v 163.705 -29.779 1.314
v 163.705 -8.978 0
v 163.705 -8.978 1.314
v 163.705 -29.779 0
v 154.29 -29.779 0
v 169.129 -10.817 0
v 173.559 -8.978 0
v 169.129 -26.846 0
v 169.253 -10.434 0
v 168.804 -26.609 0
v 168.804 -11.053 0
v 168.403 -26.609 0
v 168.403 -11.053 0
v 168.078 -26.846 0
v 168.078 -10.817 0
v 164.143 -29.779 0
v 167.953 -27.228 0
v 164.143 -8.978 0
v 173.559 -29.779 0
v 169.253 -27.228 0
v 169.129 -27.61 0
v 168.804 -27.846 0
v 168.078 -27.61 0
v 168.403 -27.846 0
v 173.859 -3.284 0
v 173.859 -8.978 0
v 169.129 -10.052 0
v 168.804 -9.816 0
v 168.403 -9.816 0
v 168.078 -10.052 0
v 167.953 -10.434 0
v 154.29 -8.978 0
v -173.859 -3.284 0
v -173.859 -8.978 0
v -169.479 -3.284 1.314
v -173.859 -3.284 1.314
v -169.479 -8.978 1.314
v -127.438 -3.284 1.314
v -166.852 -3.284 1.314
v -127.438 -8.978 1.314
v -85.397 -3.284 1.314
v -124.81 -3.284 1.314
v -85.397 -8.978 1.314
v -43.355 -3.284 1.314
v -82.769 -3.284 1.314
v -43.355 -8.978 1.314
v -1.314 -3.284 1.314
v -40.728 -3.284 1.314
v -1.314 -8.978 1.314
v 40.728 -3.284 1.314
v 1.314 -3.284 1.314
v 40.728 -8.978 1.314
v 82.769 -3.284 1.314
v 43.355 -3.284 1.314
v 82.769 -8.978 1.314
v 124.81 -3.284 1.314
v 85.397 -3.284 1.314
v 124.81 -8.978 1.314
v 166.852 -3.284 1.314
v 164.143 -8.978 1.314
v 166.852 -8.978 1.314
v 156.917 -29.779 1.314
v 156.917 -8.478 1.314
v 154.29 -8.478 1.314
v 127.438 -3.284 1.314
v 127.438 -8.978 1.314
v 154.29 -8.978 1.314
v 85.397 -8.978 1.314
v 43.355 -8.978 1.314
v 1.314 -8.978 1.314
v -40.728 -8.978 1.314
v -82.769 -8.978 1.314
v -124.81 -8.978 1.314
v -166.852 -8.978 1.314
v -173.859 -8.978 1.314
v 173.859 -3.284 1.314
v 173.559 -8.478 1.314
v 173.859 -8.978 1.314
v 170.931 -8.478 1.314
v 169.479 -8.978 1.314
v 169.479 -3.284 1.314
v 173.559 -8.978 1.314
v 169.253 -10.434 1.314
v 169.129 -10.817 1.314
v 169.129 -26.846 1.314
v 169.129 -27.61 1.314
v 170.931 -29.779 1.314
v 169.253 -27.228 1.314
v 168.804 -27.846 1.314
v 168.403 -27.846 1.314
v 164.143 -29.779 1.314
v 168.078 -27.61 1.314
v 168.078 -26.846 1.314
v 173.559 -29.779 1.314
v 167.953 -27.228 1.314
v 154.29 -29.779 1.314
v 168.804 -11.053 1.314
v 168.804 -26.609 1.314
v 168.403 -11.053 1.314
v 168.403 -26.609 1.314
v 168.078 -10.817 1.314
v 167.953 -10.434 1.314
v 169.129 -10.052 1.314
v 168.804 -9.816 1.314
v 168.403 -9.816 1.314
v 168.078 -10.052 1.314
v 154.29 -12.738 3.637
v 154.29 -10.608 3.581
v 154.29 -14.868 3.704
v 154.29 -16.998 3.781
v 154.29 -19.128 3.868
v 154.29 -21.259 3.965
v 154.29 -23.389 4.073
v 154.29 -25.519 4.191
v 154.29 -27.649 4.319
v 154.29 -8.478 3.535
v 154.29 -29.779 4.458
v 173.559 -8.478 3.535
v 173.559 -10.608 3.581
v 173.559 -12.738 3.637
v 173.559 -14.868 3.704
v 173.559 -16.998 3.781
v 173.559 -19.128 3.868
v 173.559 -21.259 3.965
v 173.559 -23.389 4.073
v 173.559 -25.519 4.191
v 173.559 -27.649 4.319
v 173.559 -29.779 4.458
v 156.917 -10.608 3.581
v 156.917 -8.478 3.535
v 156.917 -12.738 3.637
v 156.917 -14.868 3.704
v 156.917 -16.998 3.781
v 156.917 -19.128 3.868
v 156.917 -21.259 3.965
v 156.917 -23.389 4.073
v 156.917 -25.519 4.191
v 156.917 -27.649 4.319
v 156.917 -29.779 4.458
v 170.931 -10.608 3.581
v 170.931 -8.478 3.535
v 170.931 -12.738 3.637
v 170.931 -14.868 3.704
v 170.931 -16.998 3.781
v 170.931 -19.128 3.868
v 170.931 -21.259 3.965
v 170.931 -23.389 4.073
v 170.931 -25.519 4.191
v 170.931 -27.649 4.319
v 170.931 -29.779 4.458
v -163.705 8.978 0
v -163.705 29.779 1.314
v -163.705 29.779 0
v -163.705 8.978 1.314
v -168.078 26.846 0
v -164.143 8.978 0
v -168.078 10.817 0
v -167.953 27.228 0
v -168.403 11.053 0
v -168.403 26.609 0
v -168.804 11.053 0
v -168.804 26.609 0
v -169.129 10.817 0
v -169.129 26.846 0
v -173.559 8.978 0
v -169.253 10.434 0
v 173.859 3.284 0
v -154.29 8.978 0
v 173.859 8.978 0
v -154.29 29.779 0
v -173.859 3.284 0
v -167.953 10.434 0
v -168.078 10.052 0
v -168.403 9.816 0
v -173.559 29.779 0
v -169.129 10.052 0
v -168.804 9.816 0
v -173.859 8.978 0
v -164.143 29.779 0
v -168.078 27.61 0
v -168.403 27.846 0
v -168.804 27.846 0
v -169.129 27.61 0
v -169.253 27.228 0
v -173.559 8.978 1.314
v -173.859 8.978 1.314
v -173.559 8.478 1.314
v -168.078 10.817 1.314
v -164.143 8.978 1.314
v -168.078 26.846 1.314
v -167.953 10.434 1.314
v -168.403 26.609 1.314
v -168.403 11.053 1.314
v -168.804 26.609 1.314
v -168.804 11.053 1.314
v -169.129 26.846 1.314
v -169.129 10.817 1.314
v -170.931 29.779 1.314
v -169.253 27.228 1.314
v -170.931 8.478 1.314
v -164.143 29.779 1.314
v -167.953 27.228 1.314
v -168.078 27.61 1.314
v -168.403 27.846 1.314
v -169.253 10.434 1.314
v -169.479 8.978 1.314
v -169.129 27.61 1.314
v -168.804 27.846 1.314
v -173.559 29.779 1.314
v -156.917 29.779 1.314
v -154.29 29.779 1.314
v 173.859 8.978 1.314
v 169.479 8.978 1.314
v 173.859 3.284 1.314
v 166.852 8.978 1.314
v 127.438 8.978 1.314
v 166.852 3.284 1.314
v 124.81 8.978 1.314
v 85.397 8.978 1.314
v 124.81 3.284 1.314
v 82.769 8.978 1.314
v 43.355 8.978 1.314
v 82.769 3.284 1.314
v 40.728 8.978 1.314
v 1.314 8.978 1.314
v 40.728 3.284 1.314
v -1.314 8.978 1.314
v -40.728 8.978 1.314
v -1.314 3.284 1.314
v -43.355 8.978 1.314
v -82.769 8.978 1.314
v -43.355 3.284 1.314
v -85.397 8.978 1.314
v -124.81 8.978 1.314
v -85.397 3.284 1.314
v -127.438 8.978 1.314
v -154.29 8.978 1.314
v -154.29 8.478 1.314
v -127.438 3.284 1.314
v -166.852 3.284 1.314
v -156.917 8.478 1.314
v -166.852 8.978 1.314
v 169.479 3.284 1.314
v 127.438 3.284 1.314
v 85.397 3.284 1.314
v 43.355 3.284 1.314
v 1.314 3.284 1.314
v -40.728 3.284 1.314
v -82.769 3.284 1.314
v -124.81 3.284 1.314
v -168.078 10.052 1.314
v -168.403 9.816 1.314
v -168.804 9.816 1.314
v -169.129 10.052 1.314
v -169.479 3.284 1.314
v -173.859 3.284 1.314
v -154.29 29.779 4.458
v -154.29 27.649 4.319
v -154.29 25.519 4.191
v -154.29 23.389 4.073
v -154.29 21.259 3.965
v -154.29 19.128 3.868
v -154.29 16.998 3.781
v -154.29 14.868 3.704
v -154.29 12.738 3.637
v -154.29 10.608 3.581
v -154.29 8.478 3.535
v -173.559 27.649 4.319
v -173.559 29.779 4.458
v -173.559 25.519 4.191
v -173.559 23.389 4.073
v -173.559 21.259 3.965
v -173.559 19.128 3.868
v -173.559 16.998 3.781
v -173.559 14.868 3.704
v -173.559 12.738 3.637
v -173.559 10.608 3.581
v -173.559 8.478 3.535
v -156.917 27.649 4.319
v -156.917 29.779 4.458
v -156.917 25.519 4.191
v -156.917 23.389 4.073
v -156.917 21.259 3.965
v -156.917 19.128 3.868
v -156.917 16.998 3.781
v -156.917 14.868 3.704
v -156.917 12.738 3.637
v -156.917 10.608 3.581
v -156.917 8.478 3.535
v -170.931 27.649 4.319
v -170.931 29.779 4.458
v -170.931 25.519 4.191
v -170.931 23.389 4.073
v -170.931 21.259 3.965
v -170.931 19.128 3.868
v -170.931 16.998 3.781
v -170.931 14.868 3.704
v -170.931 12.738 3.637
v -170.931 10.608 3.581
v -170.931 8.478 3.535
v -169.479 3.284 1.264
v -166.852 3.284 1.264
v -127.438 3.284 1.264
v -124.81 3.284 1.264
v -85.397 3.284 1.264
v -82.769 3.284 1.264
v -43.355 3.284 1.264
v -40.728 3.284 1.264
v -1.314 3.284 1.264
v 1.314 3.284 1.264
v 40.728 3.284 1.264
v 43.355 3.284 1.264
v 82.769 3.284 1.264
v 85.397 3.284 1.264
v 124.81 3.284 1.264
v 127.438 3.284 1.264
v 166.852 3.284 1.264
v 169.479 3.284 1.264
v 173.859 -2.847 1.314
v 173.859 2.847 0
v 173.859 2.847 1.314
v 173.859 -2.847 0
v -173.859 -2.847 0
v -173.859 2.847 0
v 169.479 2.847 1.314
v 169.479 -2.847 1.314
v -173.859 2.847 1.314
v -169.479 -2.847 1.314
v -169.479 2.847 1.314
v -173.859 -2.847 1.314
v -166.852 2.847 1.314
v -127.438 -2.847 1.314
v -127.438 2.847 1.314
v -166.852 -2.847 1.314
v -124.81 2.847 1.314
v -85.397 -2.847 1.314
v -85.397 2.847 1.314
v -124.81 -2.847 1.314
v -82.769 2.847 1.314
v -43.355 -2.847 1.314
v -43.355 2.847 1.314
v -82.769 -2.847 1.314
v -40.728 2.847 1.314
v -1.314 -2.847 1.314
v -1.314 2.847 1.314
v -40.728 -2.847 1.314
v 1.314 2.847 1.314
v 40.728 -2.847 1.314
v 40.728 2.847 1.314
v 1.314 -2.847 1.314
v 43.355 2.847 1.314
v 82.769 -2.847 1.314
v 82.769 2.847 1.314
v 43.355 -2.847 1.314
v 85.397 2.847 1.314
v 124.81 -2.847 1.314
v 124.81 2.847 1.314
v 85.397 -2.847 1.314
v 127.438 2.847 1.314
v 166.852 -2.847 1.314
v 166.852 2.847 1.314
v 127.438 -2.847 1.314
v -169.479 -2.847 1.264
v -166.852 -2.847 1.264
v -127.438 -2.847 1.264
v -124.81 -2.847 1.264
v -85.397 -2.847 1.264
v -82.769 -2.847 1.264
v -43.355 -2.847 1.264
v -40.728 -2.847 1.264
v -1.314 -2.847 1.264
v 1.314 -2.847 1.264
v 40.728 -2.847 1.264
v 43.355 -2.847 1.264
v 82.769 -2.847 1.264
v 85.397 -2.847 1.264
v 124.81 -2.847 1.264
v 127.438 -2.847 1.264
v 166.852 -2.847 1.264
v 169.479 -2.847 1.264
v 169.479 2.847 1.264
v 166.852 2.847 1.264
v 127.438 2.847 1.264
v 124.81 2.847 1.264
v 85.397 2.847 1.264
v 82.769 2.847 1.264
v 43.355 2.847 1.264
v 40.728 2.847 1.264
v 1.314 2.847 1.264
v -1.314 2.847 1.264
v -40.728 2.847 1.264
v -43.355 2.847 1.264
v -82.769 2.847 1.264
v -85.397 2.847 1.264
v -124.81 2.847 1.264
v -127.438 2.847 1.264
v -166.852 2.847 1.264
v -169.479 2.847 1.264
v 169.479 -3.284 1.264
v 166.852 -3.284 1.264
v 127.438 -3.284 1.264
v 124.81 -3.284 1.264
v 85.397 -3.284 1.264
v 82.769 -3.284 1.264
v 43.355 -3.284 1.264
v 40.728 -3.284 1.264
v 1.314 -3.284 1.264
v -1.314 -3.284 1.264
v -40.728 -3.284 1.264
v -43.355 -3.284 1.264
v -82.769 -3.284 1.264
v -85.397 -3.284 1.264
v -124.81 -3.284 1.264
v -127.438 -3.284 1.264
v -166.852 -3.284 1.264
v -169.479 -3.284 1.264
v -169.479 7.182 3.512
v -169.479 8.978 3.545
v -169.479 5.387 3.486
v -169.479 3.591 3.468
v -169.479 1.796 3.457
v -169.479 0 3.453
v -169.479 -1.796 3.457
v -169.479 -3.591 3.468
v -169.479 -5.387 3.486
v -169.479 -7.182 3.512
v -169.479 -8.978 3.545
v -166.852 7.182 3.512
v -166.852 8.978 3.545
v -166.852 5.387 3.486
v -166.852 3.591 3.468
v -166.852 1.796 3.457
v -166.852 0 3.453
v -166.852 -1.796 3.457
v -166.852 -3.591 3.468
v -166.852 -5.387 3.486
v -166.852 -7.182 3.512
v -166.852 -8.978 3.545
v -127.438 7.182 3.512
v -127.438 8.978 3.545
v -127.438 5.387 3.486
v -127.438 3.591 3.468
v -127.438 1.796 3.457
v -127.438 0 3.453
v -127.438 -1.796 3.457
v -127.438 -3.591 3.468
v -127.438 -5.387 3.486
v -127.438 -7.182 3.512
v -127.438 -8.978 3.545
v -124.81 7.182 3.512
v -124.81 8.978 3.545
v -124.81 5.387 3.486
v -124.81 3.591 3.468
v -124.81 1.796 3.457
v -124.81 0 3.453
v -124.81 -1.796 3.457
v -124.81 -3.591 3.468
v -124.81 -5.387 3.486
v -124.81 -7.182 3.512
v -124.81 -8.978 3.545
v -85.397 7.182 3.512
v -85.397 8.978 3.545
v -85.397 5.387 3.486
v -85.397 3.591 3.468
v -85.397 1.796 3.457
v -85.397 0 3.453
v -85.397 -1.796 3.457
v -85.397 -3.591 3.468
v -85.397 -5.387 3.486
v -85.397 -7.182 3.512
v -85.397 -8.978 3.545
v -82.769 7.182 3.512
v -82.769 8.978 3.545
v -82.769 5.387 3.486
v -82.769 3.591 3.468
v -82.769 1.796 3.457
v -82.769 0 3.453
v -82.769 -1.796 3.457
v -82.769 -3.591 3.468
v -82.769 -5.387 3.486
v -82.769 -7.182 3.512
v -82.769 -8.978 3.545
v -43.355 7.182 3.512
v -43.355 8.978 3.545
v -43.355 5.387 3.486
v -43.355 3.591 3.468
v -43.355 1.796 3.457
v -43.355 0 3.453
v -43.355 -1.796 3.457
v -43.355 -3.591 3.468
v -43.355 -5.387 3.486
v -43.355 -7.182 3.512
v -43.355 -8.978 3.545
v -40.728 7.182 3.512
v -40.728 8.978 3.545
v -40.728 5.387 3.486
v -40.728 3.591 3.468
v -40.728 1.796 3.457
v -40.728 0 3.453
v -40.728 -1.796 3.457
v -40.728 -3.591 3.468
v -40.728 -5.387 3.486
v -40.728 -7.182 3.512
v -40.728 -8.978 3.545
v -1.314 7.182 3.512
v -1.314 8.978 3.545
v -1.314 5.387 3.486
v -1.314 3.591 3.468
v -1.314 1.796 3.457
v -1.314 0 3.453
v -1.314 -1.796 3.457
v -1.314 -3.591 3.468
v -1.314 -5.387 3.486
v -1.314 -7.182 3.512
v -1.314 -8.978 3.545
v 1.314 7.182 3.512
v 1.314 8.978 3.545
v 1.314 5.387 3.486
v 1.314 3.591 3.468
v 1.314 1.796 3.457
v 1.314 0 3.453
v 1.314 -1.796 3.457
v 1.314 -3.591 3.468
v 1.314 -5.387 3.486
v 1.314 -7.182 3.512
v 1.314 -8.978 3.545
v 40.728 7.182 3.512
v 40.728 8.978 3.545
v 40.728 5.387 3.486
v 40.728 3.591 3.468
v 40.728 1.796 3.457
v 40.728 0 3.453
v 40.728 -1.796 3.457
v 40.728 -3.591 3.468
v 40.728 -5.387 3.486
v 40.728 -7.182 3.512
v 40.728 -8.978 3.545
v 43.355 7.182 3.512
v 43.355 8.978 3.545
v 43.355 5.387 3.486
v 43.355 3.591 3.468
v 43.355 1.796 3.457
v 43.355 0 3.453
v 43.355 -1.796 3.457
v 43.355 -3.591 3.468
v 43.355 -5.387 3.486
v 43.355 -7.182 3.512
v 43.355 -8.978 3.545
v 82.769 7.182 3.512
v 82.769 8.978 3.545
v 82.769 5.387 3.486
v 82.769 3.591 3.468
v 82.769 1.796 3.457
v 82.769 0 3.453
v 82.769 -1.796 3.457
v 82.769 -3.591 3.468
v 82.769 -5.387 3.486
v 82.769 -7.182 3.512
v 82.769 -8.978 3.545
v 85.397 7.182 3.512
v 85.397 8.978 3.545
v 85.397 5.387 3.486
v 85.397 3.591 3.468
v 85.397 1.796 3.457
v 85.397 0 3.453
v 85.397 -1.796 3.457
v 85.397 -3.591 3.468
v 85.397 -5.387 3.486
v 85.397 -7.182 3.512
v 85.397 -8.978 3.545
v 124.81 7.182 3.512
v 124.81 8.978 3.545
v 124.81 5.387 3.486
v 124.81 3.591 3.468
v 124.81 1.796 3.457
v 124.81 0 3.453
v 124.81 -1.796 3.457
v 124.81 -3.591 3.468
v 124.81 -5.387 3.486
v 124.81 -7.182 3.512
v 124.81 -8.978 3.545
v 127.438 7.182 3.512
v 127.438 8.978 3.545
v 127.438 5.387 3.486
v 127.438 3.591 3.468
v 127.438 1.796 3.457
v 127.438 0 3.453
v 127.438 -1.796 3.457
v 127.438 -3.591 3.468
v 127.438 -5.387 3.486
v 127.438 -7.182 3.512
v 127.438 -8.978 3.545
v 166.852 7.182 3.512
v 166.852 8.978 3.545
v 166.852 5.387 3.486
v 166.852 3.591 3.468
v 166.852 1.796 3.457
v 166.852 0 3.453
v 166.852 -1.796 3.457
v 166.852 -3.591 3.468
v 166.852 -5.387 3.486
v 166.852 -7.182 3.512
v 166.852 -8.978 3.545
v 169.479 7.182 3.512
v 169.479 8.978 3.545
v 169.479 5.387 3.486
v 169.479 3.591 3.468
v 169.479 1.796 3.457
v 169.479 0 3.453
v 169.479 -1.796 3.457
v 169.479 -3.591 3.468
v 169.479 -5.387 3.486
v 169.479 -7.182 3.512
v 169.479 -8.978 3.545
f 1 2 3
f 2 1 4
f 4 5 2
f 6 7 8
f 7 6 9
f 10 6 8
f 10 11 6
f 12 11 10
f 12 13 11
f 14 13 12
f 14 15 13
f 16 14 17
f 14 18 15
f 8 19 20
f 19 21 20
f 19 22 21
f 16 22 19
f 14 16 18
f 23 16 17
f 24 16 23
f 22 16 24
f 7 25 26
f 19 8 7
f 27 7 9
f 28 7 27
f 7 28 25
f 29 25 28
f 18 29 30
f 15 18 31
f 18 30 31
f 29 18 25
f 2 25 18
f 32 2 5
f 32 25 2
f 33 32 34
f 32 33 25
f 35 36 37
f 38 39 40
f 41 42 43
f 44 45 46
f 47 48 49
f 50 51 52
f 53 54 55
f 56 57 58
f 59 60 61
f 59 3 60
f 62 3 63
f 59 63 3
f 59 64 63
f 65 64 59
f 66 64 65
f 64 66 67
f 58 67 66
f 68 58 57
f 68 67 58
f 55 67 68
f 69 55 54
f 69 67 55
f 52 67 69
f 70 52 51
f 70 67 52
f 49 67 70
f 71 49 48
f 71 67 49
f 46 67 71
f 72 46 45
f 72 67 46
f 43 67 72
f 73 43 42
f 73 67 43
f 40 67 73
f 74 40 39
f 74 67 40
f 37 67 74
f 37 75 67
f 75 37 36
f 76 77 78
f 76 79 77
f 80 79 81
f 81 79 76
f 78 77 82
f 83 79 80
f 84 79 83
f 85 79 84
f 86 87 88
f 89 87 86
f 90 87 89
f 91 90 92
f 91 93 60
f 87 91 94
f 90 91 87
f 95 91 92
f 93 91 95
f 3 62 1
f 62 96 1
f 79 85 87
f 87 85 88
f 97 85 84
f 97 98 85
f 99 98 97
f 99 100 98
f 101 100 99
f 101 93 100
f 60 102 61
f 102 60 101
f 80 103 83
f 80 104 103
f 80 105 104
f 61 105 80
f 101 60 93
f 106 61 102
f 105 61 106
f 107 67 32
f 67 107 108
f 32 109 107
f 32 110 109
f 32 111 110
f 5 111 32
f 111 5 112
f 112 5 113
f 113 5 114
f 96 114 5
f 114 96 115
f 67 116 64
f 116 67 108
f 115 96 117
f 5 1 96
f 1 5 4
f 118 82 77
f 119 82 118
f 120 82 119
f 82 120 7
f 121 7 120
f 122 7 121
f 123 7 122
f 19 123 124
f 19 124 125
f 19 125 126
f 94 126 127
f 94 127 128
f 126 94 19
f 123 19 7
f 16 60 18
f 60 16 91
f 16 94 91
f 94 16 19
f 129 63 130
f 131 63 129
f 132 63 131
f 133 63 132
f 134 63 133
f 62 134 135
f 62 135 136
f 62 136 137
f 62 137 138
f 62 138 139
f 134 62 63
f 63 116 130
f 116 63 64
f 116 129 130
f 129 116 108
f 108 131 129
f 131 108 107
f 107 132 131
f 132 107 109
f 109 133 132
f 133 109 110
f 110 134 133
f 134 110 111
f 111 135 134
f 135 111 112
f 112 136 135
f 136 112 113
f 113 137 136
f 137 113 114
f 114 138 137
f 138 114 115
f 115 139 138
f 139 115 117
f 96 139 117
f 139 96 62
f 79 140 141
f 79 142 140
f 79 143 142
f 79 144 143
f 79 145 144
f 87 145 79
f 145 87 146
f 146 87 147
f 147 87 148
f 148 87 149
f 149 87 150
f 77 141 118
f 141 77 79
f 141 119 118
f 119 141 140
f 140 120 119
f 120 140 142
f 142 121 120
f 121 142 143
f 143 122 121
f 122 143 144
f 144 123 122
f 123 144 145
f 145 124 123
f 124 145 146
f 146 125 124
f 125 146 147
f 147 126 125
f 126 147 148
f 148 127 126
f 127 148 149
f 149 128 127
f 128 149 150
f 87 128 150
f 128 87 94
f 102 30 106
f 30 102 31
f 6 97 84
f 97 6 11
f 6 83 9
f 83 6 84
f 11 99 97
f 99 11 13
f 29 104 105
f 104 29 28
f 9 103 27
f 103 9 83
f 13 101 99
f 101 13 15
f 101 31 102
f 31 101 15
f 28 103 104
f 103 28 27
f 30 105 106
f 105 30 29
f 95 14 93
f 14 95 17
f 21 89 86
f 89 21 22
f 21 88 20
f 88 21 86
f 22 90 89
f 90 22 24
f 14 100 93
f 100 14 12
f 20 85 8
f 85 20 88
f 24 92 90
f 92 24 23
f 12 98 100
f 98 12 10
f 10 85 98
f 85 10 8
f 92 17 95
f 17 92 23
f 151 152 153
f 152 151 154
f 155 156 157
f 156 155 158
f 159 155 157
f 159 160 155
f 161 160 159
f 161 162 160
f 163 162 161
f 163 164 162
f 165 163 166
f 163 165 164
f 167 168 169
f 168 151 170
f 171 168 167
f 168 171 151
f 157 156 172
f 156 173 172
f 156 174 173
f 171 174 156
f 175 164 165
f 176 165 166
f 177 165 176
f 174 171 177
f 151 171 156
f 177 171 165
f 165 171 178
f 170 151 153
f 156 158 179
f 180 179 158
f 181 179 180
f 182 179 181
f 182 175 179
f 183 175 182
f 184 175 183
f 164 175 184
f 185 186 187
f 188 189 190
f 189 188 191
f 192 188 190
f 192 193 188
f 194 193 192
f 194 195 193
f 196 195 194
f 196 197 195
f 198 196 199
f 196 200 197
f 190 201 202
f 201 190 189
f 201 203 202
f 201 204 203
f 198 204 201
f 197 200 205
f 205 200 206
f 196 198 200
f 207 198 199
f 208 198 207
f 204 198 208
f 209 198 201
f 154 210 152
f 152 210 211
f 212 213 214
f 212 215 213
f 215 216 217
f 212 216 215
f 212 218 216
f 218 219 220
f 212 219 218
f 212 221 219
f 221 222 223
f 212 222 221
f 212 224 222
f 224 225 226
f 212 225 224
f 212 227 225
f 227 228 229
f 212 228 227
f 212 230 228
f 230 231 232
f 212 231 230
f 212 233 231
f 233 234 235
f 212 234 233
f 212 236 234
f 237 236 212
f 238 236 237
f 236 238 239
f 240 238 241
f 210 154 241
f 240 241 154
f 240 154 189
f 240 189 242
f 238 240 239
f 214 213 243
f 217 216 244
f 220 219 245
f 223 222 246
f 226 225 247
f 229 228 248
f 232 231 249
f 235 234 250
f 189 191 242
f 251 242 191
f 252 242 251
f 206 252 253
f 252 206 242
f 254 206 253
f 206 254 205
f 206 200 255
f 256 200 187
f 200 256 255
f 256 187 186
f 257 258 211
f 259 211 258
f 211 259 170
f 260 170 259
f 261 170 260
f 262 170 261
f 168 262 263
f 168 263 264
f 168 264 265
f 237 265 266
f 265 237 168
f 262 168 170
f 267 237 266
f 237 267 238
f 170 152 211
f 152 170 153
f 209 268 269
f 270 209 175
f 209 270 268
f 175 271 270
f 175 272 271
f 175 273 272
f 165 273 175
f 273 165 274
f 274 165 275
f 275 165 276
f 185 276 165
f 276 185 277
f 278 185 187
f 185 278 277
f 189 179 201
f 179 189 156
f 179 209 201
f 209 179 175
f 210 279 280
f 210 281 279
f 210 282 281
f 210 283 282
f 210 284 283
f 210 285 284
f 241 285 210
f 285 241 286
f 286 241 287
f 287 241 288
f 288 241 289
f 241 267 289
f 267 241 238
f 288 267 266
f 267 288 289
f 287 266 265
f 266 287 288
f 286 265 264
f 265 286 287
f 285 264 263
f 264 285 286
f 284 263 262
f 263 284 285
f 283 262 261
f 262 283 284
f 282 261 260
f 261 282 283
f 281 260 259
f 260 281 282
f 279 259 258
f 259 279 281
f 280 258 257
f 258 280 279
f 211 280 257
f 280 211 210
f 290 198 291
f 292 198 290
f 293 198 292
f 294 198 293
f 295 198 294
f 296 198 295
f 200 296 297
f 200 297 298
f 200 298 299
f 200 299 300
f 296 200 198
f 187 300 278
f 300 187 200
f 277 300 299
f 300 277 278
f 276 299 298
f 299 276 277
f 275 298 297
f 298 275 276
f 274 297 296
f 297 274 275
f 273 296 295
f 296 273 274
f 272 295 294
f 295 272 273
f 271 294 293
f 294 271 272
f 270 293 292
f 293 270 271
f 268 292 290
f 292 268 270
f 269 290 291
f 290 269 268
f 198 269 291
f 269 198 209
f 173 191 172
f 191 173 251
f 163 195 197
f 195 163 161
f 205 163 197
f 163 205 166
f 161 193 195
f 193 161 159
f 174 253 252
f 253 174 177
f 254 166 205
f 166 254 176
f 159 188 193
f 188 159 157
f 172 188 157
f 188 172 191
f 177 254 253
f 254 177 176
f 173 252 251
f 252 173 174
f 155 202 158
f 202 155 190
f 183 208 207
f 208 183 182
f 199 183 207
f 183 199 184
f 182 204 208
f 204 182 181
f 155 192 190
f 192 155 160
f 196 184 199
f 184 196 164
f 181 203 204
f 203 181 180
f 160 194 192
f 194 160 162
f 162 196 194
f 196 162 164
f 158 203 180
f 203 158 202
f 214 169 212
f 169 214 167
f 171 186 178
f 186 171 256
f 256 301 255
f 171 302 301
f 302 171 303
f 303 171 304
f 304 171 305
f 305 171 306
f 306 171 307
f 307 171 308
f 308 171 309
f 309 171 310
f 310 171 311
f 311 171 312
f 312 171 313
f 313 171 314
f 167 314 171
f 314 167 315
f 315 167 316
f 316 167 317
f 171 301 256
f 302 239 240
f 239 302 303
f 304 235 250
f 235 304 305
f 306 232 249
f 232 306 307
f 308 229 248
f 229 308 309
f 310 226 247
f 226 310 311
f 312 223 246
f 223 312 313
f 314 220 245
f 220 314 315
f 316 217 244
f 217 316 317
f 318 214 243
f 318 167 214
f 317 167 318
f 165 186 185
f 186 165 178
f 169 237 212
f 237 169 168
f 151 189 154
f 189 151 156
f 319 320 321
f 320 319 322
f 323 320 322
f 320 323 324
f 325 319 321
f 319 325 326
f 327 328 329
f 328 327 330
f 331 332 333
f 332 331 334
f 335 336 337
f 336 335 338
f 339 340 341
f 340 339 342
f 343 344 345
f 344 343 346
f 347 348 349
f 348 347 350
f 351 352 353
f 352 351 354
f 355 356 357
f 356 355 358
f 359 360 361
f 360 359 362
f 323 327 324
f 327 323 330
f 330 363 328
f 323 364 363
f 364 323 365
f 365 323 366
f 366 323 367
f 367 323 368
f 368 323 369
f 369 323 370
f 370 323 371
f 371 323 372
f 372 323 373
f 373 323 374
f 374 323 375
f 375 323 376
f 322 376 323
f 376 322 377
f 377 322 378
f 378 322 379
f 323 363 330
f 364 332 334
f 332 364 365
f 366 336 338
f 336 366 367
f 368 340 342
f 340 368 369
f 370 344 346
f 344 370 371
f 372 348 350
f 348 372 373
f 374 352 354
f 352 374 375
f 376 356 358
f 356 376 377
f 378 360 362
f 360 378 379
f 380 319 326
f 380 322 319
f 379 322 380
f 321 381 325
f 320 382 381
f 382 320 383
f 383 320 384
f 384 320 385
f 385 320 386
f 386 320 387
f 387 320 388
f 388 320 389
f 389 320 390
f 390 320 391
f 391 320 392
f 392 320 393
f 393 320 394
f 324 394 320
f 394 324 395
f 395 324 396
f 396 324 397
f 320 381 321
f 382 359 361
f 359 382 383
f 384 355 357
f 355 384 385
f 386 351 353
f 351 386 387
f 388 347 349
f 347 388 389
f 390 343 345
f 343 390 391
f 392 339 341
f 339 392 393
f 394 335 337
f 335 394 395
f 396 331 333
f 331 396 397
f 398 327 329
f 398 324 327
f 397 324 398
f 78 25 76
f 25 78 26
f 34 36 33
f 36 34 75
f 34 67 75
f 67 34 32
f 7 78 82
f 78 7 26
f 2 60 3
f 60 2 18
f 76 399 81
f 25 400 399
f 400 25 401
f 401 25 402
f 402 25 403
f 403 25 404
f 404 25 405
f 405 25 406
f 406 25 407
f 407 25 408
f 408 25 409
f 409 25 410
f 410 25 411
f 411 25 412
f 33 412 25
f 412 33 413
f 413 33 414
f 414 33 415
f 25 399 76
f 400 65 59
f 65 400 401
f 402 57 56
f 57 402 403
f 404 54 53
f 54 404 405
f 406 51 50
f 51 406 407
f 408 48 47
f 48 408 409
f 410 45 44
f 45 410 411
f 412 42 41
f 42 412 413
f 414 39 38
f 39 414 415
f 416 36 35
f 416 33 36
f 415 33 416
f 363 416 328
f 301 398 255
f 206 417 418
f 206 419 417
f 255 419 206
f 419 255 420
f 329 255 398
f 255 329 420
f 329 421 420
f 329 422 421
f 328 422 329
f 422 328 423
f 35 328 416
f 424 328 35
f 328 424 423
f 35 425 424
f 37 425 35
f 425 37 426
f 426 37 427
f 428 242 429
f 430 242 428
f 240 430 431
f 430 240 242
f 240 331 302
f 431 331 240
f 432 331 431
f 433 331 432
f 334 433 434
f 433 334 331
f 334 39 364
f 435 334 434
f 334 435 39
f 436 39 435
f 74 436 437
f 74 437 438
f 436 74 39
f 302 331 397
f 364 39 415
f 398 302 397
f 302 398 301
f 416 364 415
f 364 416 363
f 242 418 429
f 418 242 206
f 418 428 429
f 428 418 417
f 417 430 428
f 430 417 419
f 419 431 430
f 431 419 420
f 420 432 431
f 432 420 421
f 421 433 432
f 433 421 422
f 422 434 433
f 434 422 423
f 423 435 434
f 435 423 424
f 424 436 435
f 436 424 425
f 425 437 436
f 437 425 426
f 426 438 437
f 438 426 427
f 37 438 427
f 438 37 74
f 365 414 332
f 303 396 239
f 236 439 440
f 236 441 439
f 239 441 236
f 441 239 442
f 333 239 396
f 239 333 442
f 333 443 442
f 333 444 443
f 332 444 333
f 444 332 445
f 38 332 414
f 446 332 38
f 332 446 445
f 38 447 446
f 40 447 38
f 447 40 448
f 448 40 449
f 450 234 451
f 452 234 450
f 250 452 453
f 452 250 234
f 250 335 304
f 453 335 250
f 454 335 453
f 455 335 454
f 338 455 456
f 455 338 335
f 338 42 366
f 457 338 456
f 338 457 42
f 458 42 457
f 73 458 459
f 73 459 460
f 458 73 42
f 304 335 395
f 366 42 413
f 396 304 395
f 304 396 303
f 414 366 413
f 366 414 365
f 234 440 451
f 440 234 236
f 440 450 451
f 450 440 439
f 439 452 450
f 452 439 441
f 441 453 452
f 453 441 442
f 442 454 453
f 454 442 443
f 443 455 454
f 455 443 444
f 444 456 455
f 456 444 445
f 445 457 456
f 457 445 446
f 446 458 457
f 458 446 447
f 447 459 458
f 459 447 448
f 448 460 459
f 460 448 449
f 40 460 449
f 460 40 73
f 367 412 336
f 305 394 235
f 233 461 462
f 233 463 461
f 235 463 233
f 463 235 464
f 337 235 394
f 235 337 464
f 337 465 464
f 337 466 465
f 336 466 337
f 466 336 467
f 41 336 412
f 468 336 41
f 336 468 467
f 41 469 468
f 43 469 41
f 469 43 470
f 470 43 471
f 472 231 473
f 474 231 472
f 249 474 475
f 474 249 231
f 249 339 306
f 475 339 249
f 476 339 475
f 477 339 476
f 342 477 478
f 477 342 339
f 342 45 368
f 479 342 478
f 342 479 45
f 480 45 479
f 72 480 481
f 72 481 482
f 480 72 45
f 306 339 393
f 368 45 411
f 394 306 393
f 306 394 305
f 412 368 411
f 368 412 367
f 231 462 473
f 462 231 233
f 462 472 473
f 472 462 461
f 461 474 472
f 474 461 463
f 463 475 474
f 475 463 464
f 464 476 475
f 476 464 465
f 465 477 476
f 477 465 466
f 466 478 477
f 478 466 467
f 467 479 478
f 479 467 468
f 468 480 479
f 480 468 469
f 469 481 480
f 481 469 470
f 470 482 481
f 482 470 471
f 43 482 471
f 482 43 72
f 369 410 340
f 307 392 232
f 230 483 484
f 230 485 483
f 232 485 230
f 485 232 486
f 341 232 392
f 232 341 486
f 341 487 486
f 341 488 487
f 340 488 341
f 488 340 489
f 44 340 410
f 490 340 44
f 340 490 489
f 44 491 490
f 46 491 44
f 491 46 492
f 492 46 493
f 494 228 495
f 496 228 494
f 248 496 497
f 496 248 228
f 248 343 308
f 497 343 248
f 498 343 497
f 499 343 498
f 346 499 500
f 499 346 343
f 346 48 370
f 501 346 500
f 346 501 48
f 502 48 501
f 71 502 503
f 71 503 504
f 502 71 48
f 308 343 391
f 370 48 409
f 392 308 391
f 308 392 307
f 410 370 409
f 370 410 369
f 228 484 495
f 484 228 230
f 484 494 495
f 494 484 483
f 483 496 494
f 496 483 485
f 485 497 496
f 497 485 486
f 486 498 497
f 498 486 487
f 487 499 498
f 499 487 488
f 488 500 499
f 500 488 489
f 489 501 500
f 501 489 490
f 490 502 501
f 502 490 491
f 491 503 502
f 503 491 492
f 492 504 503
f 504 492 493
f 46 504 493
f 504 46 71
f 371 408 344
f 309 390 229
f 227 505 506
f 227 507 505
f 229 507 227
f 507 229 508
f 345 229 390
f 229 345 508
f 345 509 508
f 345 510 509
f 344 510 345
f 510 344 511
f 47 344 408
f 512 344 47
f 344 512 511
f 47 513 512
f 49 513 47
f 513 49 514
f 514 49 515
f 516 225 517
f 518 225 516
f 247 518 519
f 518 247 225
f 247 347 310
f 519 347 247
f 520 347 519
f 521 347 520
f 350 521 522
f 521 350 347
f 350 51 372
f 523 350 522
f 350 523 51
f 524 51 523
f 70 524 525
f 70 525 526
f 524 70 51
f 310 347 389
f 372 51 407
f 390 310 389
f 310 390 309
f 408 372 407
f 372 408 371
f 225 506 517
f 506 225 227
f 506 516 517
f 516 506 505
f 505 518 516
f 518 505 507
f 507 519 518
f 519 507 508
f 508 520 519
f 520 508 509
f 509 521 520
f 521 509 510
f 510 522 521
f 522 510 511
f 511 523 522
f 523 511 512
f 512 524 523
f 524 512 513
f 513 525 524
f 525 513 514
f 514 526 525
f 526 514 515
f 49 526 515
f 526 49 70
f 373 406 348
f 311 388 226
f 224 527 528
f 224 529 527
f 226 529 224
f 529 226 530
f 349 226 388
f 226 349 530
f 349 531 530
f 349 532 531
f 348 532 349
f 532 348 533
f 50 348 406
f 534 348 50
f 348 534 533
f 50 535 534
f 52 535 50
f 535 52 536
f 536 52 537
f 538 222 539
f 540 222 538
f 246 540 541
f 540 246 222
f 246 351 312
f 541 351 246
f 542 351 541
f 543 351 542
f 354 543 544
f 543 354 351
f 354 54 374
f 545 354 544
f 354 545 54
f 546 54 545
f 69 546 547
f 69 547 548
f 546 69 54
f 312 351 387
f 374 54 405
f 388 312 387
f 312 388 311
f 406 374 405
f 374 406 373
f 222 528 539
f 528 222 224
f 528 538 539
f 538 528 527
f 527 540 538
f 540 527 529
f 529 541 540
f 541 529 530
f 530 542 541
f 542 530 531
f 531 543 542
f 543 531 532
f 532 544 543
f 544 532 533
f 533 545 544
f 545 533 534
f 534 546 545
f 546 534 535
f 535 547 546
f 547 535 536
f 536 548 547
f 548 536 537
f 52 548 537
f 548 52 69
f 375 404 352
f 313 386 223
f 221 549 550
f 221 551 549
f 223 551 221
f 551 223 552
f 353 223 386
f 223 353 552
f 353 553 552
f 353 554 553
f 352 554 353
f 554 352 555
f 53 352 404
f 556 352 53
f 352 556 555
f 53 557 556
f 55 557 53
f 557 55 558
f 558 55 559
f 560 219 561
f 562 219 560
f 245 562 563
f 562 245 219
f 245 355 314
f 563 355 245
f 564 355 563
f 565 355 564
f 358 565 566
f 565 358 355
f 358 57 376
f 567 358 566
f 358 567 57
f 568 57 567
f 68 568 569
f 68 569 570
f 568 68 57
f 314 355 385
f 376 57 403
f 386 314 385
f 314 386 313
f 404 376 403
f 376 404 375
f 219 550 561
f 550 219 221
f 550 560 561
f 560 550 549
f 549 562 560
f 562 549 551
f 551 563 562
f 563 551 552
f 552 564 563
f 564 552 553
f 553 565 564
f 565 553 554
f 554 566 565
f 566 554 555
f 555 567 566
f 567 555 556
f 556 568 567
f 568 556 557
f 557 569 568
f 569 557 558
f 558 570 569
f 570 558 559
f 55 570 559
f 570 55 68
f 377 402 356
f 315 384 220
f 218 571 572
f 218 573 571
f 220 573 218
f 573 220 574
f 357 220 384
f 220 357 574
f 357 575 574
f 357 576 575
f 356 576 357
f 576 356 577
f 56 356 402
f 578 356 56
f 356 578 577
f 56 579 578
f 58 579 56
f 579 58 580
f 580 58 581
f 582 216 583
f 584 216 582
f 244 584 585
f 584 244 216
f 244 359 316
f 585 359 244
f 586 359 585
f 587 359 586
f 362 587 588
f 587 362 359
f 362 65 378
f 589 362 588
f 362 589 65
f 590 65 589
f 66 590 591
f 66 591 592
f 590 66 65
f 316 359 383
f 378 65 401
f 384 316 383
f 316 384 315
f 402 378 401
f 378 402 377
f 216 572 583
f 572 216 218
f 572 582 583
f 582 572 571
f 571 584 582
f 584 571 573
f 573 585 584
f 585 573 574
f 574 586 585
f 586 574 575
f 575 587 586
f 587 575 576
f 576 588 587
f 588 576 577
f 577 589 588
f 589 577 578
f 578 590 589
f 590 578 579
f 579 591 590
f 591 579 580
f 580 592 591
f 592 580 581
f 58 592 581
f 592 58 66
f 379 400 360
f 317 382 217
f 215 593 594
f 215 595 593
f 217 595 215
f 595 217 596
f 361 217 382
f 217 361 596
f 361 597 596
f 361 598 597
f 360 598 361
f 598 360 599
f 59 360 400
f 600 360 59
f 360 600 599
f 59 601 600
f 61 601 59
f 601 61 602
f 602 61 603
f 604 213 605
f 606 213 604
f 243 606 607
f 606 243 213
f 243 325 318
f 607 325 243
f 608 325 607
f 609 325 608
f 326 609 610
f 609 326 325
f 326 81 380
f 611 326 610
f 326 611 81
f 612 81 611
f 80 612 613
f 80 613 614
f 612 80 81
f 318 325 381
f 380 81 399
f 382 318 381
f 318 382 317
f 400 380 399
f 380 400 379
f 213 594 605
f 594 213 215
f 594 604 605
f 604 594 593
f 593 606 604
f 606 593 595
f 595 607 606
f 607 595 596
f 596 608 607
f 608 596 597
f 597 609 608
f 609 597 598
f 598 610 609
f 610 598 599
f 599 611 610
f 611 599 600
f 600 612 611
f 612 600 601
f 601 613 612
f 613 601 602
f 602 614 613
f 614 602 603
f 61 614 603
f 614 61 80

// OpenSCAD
// =====================================================================
//  VIEW 05: ROOFWALK  -  print 1
//  Milwaukee Road 1939 rib side bay window caboose - G scale (1:29)
//  Wood roofwalk plus short crosswise running boards
//  Print orientation: boards down
//
//  Open this file in OpenSCAD to look at just this part.
//  To export this part's STL: Render (F6), then File > Export > STL.
//  The part's code lives in library/roofwalk.scad; settings in
//  library/caboose_params.scad.
// =====================================================================

part     = "roofwalk";    // which part - leave as is
view     = "print";  // "print"     = laid out as it goes on the printer bed
                     //               (same as the exported STL)
                     // "installed" = in its place on the car (all copies)
show_car = false;    // with "installed": faint see-through body, roof and
                     //   underframe around it for context

include <../library/caboose_all.scad>

if (view == "installed") {
    caboose_installed(part);
    if (show_car) car_ghost();
} else {
    caboose_print(part);
}
echo(str("roofwalk: print 1"));
